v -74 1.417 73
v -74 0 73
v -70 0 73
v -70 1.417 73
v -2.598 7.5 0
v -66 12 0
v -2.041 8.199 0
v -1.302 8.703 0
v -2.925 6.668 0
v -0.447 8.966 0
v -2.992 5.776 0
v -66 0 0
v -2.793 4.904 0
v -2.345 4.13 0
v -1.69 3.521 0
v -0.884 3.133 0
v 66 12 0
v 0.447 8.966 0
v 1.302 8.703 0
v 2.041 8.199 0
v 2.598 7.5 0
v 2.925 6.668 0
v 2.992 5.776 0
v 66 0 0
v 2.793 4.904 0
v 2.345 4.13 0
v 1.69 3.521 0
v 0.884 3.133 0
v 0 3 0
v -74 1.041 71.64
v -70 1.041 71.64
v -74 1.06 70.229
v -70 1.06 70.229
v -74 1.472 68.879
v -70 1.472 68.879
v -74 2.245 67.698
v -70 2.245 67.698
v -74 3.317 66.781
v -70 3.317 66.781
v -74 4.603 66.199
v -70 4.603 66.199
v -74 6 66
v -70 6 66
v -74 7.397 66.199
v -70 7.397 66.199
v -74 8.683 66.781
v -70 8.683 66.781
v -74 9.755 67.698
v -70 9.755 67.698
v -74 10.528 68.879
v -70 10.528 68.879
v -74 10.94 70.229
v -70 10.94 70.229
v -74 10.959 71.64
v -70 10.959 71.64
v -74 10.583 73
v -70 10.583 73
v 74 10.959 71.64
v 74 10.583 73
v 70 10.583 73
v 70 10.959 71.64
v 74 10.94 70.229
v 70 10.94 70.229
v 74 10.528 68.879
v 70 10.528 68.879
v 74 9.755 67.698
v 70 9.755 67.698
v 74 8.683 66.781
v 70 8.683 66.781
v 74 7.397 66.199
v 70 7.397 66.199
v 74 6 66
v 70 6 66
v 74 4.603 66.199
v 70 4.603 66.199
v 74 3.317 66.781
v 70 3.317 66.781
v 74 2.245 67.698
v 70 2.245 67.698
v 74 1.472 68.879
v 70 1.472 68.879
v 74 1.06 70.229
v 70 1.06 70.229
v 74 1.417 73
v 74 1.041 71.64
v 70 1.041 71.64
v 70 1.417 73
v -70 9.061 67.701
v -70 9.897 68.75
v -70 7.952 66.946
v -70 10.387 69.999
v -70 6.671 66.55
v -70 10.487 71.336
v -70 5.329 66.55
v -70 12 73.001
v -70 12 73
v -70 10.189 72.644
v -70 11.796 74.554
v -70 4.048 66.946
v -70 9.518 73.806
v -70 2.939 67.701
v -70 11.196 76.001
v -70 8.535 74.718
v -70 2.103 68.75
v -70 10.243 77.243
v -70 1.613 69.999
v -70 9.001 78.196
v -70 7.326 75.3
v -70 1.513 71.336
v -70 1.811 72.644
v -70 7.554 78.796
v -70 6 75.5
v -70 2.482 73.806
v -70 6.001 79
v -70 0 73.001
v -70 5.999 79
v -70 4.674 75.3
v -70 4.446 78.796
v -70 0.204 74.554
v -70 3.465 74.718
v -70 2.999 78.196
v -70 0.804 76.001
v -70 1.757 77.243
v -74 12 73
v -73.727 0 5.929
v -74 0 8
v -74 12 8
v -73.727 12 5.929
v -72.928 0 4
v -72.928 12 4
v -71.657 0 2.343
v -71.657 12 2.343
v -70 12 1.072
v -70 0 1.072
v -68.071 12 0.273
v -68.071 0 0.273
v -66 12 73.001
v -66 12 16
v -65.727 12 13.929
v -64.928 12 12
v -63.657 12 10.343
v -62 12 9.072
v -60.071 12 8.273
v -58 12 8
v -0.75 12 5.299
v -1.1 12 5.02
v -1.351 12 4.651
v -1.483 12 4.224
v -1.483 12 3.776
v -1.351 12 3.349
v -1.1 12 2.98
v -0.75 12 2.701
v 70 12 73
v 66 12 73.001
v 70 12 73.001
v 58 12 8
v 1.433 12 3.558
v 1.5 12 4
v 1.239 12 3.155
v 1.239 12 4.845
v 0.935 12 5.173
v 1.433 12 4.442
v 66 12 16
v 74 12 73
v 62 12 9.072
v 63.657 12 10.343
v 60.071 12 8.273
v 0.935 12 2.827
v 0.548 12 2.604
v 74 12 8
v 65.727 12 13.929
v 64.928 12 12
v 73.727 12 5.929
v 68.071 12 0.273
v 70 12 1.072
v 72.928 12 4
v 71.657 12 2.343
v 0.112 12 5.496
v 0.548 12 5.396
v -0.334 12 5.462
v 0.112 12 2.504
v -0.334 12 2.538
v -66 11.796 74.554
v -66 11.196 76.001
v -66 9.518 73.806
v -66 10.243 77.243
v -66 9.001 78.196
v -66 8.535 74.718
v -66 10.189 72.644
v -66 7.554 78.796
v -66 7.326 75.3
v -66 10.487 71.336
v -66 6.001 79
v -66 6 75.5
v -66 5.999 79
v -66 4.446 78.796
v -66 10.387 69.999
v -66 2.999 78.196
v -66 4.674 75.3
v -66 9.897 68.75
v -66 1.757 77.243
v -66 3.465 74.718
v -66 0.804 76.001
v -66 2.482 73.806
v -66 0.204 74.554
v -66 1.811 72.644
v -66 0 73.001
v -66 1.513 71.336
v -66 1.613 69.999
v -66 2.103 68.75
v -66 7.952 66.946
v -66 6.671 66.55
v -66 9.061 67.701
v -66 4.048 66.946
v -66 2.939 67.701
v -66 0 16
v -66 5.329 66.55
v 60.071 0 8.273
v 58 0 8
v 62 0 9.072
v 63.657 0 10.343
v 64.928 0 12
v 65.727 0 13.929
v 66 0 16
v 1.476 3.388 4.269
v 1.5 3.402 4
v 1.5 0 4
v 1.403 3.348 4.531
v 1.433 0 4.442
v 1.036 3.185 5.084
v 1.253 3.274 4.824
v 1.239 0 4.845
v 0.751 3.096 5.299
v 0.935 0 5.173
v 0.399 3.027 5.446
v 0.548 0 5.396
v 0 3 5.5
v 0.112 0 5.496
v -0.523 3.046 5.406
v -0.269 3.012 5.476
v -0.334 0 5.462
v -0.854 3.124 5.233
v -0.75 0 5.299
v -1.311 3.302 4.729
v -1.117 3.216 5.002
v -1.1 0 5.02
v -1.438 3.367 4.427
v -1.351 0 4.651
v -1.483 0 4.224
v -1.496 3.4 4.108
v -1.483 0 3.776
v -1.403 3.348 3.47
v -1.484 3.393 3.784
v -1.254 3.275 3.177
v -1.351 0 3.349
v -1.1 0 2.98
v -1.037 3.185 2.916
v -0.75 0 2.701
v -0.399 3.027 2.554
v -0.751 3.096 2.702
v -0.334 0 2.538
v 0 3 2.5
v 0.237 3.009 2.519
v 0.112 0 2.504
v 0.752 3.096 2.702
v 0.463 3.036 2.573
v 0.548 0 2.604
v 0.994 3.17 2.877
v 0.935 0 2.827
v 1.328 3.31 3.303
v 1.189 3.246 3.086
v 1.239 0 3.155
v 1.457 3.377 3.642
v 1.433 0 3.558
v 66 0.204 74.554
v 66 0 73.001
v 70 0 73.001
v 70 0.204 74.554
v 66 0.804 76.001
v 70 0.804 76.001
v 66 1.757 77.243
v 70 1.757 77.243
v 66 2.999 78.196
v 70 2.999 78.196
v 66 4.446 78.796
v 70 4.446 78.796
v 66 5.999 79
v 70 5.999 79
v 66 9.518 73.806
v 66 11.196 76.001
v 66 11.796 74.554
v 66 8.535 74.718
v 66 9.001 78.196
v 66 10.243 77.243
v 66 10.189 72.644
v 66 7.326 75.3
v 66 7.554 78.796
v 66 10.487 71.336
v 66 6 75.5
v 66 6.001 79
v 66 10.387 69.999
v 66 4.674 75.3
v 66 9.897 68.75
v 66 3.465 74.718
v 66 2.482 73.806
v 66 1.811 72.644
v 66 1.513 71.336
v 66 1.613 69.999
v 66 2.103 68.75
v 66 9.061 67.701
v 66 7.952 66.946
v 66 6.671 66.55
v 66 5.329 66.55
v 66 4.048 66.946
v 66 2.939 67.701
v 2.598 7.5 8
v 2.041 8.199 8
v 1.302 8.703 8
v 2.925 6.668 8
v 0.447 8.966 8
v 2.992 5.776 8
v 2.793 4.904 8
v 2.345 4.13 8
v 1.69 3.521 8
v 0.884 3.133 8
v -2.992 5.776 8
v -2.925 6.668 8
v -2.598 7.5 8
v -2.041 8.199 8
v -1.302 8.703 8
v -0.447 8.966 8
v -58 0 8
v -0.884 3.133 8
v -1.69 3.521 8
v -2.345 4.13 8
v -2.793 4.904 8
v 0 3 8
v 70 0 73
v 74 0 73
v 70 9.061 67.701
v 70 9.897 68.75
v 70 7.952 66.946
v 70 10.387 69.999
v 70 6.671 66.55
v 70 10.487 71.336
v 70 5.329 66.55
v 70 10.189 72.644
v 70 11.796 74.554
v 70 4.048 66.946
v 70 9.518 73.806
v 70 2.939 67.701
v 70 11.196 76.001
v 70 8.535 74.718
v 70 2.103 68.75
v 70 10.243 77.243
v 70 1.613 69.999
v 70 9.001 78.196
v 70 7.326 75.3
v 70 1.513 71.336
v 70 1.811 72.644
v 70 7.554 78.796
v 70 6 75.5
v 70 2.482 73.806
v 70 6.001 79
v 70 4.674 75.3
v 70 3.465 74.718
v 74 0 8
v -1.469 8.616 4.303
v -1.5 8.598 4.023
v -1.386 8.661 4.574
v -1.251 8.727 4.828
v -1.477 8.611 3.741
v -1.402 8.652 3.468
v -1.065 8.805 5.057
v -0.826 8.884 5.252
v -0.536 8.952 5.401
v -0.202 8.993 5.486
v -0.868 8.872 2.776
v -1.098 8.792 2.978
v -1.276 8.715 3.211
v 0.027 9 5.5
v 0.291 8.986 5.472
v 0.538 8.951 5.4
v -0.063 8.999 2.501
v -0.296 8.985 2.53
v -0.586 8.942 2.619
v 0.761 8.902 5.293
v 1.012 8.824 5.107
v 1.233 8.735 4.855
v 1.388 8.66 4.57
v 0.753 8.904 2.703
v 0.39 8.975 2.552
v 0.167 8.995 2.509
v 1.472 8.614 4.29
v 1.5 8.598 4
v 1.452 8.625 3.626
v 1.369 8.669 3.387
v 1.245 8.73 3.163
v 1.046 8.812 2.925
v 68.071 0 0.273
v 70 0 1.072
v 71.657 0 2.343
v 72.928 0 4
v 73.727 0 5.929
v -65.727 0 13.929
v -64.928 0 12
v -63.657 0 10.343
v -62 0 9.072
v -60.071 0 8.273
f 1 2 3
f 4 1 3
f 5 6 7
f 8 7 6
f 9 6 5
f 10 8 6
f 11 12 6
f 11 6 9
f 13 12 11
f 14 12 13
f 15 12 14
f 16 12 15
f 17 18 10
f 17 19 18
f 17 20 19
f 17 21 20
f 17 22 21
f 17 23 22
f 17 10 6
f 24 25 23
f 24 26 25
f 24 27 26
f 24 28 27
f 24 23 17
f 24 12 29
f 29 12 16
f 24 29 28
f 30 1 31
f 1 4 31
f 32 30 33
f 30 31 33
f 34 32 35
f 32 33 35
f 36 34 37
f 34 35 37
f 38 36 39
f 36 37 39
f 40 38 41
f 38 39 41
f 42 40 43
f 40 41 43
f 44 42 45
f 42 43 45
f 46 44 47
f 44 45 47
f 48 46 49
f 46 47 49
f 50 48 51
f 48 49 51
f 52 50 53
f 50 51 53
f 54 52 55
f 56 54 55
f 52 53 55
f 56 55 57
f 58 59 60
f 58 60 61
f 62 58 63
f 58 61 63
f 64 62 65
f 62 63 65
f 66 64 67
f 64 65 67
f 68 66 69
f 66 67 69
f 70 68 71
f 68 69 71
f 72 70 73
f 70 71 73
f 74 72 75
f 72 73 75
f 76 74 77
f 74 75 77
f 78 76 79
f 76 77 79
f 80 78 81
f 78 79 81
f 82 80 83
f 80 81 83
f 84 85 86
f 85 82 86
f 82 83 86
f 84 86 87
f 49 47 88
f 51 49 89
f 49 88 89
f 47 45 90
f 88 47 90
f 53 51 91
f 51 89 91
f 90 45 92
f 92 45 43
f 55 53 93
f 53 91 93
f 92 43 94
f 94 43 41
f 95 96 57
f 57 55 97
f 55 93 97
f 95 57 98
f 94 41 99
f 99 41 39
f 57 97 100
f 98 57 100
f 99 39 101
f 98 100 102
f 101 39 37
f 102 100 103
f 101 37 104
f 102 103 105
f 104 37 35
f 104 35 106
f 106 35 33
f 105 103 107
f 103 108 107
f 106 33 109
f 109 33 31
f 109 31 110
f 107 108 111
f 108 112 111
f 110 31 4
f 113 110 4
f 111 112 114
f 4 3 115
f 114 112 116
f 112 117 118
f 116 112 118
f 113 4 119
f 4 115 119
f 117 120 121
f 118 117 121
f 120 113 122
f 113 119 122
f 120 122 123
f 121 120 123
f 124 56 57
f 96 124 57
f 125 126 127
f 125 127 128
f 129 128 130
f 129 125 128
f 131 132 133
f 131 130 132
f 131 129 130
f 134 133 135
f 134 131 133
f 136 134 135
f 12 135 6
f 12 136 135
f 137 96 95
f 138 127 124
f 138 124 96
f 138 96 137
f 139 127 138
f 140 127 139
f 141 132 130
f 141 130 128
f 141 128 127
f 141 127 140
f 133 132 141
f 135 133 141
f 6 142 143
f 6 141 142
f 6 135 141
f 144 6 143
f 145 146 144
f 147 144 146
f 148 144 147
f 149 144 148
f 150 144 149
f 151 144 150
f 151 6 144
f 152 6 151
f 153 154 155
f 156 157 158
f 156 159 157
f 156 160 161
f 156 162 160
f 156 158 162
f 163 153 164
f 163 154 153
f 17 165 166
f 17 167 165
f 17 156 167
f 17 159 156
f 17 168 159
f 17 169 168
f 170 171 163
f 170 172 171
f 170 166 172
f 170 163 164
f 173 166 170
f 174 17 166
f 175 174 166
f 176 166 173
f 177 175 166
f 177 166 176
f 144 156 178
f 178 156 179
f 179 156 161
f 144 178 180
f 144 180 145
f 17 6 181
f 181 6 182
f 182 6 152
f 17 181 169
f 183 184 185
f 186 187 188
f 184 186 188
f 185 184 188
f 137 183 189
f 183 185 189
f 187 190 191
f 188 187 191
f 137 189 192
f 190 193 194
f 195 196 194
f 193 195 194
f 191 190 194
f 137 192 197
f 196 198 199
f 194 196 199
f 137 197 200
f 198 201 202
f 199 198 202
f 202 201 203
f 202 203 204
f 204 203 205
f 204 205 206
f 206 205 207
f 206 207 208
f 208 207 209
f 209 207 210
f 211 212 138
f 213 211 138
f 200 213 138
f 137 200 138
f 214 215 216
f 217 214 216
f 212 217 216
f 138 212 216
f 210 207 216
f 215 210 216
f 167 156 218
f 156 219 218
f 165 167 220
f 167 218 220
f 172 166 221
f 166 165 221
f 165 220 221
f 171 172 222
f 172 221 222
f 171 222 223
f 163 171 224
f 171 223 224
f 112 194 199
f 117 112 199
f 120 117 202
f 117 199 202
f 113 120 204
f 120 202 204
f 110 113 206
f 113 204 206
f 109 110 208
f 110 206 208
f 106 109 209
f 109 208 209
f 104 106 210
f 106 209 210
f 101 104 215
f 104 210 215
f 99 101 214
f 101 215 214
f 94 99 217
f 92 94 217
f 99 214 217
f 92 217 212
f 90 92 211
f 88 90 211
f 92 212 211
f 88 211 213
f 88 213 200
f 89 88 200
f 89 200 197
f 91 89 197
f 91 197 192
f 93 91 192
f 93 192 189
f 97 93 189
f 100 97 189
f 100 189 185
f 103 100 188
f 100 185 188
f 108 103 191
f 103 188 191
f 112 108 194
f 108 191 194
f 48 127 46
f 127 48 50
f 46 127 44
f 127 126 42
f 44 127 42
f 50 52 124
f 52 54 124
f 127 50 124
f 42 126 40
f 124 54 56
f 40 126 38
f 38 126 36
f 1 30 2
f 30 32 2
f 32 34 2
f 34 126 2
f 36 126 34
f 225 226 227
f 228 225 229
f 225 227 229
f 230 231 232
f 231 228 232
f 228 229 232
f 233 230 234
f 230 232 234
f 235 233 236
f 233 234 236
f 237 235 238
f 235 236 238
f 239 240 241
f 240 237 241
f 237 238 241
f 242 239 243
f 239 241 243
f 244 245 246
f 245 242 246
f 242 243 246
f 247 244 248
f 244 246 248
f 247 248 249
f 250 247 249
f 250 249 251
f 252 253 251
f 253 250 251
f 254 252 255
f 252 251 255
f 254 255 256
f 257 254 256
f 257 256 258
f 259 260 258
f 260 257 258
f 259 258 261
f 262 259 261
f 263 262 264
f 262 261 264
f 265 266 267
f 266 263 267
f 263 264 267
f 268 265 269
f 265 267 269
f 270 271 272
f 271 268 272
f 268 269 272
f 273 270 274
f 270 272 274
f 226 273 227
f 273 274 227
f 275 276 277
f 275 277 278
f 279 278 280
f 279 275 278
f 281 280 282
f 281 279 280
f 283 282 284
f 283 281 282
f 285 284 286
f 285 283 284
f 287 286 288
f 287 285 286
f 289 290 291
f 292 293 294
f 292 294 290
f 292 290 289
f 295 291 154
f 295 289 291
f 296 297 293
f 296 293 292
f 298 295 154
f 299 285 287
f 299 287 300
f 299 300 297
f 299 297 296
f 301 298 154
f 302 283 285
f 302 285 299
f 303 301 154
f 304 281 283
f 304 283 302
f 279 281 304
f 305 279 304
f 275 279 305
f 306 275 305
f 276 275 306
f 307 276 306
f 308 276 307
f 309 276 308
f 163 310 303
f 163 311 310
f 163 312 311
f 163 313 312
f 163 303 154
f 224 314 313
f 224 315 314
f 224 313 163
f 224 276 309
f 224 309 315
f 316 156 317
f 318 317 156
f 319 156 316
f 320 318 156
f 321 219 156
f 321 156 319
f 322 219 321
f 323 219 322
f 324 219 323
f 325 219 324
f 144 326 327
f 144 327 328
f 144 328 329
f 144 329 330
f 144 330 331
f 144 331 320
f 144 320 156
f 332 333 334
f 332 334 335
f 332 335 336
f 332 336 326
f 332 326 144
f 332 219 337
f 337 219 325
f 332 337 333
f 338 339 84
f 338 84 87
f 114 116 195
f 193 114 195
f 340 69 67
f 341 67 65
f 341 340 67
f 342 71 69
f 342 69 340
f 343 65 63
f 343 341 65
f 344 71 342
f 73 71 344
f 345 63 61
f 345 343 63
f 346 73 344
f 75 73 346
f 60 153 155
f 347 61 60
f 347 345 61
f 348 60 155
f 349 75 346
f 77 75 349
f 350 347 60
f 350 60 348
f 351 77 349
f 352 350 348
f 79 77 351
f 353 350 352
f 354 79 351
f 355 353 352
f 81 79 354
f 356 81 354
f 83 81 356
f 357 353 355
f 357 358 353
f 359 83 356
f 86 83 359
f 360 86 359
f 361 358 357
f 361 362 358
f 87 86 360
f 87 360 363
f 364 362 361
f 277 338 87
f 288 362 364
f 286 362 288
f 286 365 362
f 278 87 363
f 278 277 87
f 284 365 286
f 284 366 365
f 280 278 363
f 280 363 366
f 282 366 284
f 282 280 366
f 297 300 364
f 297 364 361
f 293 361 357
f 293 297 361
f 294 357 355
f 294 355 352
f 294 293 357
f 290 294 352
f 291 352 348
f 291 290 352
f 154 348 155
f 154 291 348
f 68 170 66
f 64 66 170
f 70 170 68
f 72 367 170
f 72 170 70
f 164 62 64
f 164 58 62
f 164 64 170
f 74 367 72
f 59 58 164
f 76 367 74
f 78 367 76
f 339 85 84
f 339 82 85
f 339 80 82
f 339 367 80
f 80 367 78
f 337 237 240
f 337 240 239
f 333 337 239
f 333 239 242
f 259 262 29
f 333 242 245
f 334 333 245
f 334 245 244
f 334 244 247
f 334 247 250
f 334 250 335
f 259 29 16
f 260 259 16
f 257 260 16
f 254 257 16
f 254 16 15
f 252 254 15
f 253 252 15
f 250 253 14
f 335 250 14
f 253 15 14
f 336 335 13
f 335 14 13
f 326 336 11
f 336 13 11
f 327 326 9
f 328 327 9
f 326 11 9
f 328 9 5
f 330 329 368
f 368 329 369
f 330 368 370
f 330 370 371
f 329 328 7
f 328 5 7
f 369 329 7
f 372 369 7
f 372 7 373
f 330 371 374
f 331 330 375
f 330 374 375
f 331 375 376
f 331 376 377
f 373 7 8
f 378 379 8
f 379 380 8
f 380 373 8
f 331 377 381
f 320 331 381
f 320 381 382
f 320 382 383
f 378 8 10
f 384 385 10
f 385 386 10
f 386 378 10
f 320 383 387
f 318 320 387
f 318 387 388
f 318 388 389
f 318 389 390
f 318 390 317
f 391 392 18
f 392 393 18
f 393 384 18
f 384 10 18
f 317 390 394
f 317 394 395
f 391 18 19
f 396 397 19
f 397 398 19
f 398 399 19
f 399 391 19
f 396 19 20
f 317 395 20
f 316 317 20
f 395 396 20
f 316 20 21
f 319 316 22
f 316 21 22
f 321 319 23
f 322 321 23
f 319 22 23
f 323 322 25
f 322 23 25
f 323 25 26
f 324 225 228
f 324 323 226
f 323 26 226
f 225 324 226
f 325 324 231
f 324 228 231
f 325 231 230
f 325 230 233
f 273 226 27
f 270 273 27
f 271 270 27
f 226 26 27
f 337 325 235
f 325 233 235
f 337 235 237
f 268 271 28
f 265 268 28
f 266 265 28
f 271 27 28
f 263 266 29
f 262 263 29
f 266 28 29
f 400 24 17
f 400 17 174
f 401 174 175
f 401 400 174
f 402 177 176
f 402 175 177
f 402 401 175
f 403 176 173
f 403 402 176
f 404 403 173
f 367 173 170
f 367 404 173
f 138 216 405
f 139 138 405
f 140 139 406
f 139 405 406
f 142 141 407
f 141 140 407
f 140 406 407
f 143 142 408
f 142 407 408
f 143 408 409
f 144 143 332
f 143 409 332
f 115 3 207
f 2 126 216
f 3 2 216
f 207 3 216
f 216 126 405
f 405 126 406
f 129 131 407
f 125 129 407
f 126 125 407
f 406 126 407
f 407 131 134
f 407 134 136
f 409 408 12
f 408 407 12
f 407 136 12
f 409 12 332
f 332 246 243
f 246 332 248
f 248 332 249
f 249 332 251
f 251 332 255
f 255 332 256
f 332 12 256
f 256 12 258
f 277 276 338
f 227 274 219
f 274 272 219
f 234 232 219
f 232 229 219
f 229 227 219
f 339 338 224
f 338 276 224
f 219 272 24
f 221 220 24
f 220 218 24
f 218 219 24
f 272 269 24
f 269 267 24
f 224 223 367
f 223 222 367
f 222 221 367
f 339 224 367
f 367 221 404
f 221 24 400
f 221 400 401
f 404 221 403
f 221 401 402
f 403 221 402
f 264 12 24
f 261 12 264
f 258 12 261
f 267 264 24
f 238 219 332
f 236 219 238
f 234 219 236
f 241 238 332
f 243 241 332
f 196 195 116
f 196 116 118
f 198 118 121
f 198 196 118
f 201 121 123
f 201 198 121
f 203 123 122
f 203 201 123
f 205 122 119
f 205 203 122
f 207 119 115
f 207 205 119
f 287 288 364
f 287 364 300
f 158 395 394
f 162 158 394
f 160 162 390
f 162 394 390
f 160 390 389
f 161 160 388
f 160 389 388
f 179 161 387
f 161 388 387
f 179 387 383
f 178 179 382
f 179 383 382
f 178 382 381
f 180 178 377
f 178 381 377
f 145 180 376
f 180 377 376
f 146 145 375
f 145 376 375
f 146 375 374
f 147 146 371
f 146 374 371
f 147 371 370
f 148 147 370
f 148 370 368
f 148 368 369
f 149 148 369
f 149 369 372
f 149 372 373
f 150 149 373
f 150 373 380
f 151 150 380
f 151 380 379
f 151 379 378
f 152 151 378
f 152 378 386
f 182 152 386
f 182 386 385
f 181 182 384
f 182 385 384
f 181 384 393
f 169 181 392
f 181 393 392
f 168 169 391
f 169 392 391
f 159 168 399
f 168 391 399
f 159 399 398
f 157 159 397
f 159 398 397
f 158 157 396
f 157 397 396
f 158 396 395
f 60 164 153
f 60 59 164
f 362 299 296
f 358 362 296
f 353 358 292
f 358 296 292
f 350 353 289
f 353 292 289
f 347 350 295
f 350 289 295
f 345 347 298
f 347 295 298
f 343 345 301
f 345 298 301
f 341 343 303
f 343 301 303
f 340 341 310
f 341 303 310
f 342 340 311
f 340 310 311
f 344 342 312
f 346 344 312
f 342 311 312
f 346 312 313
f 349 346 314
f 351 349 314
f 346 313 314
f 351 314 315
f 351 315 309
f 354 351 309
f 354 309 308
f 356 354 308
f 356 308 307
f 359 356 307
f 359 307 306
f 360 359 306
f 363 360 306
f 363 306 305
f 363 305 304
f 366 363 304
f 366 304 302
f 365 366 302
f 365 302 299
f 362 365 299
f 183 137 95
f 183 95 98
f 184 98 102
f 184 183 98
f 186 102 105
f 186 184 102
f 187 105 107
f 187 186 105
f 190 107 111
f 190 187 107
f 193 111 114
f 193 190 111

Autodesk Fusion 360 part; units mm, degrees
sketch "Sketch1" plane through (0, 0, 0) normal (0, 1, 0) x (1, 0, 0)
  line L0 (0, 0) -> (66, 0)
  line L1 (0, 0) -> (0, -8) construction
  line L2 (74, -8) -> (74, -73)
  line L3 (74, -73) -> (70, -73)
  line L4 (70, -73) -> (70, -79)
  line L5 (70, -79) -> (66, -79)
  line L6 (66, -79) -> (66, -16)
  line L7 (58, -8) -> (0, -8)
  arc A0 (66, -16) -> (58, -8) centre (58, -16) ccw
  arc A1 (74, -8) -> (66, 0) centre (66, -8) ccw
  line L8 (-58, -8) -> (0, -8)
  line L9 (0, 0) -> (-66, 0)
  arc A2 (-66, 0) -> (-74, -8) centre (-66, -8) ccw
  line L10 (-74, -8) -> (-74, -73)
  arc A3 (-58, -8) -> (-66, -16) centre (-58, -16) ccw
  line L11 (-66, -79) -> (-66, -16)
  line L12 (-70, -79) -> (-66, -79)
  line L13 (-70, -73) -> (-70, -79)
  line L14 (-74, -73) -> (-70, -73)
  circle A4 centre (0, -4) radius 1.5
  point P0 (74, 0)
  point P1 (66, -8)
  dimension "d1" = 74
  dimension "d2" = 8
  dimension "d3" = 73
  dimension "d4" = 4
  dimension "d5" = 6
  dimension "d6" = 4
  dimension "d7" = 71
  dimension "d8" = 8
  dimension "d9" = 8
  dimension "d10" = 3
extrude "Extrude1" add sketch "Sketch1" along normal blind 12
fillet "Fillet1" radius 6 4 edges at (68, 12, 79) (68, 0, 79) (-68, 12, 79) (-68, 0, 79)
sketch "Sketch2" plane through (-74, 0, 0) normal (1, 0, 0) x (0, 1, 0)
  arc A0 (12, 73) -> (0, 73) centre (6, 73) ccw
  line L0 (0, 73) -> (0, 16)
  line L1 (0, 16) -> (12, 16)
  line L2 (12, 16) -> (12, 73)
  line L3 (6, 16) -> (6, 71) construction
  circle A1 centre (6, 71) radius 4.5
  line L4 (0, 8) -> (0, 73)
  line L5 (0, 73) -> (12, 73)
  line L6 (12, 73) -> (12, 8)
  line L7 (12, 8) -> (0, 8)
  dimension "d15" = 55
  dimension "d16" = 9
hole "Hole1" at (-74, 6, 71) direction (1, 0, 0) diameter 9 depth 10 tip angle 118 counterbore diameter 10 counterbore depth 4
mirror "Mirror1" about plane through (0, 0, 0) normal (1, 0, 0) of "Hole1"
sketch "Sketch3" plane through (0, 0, 8) normal (0, 0, 1) x (-1, 0, 0)
  line L0 (58, 0) -> (-58, 0)
  line L1 (-58, 0) -> (-58, -12)
  line L2 (-58, -12) -> (58, -12)
  line L3 (58, -12) -> (58, 0)
  line L4 (0, 0) -> (0, -6) construction
  circle A0 centre (0, -6) radius 3
  dimension "d24" = 6
  dimension "d25" = 6
hole "Hole2" at (0, 6, 8) direction (0, 0, -1) diameter 6 depth 10 tip angle 118
